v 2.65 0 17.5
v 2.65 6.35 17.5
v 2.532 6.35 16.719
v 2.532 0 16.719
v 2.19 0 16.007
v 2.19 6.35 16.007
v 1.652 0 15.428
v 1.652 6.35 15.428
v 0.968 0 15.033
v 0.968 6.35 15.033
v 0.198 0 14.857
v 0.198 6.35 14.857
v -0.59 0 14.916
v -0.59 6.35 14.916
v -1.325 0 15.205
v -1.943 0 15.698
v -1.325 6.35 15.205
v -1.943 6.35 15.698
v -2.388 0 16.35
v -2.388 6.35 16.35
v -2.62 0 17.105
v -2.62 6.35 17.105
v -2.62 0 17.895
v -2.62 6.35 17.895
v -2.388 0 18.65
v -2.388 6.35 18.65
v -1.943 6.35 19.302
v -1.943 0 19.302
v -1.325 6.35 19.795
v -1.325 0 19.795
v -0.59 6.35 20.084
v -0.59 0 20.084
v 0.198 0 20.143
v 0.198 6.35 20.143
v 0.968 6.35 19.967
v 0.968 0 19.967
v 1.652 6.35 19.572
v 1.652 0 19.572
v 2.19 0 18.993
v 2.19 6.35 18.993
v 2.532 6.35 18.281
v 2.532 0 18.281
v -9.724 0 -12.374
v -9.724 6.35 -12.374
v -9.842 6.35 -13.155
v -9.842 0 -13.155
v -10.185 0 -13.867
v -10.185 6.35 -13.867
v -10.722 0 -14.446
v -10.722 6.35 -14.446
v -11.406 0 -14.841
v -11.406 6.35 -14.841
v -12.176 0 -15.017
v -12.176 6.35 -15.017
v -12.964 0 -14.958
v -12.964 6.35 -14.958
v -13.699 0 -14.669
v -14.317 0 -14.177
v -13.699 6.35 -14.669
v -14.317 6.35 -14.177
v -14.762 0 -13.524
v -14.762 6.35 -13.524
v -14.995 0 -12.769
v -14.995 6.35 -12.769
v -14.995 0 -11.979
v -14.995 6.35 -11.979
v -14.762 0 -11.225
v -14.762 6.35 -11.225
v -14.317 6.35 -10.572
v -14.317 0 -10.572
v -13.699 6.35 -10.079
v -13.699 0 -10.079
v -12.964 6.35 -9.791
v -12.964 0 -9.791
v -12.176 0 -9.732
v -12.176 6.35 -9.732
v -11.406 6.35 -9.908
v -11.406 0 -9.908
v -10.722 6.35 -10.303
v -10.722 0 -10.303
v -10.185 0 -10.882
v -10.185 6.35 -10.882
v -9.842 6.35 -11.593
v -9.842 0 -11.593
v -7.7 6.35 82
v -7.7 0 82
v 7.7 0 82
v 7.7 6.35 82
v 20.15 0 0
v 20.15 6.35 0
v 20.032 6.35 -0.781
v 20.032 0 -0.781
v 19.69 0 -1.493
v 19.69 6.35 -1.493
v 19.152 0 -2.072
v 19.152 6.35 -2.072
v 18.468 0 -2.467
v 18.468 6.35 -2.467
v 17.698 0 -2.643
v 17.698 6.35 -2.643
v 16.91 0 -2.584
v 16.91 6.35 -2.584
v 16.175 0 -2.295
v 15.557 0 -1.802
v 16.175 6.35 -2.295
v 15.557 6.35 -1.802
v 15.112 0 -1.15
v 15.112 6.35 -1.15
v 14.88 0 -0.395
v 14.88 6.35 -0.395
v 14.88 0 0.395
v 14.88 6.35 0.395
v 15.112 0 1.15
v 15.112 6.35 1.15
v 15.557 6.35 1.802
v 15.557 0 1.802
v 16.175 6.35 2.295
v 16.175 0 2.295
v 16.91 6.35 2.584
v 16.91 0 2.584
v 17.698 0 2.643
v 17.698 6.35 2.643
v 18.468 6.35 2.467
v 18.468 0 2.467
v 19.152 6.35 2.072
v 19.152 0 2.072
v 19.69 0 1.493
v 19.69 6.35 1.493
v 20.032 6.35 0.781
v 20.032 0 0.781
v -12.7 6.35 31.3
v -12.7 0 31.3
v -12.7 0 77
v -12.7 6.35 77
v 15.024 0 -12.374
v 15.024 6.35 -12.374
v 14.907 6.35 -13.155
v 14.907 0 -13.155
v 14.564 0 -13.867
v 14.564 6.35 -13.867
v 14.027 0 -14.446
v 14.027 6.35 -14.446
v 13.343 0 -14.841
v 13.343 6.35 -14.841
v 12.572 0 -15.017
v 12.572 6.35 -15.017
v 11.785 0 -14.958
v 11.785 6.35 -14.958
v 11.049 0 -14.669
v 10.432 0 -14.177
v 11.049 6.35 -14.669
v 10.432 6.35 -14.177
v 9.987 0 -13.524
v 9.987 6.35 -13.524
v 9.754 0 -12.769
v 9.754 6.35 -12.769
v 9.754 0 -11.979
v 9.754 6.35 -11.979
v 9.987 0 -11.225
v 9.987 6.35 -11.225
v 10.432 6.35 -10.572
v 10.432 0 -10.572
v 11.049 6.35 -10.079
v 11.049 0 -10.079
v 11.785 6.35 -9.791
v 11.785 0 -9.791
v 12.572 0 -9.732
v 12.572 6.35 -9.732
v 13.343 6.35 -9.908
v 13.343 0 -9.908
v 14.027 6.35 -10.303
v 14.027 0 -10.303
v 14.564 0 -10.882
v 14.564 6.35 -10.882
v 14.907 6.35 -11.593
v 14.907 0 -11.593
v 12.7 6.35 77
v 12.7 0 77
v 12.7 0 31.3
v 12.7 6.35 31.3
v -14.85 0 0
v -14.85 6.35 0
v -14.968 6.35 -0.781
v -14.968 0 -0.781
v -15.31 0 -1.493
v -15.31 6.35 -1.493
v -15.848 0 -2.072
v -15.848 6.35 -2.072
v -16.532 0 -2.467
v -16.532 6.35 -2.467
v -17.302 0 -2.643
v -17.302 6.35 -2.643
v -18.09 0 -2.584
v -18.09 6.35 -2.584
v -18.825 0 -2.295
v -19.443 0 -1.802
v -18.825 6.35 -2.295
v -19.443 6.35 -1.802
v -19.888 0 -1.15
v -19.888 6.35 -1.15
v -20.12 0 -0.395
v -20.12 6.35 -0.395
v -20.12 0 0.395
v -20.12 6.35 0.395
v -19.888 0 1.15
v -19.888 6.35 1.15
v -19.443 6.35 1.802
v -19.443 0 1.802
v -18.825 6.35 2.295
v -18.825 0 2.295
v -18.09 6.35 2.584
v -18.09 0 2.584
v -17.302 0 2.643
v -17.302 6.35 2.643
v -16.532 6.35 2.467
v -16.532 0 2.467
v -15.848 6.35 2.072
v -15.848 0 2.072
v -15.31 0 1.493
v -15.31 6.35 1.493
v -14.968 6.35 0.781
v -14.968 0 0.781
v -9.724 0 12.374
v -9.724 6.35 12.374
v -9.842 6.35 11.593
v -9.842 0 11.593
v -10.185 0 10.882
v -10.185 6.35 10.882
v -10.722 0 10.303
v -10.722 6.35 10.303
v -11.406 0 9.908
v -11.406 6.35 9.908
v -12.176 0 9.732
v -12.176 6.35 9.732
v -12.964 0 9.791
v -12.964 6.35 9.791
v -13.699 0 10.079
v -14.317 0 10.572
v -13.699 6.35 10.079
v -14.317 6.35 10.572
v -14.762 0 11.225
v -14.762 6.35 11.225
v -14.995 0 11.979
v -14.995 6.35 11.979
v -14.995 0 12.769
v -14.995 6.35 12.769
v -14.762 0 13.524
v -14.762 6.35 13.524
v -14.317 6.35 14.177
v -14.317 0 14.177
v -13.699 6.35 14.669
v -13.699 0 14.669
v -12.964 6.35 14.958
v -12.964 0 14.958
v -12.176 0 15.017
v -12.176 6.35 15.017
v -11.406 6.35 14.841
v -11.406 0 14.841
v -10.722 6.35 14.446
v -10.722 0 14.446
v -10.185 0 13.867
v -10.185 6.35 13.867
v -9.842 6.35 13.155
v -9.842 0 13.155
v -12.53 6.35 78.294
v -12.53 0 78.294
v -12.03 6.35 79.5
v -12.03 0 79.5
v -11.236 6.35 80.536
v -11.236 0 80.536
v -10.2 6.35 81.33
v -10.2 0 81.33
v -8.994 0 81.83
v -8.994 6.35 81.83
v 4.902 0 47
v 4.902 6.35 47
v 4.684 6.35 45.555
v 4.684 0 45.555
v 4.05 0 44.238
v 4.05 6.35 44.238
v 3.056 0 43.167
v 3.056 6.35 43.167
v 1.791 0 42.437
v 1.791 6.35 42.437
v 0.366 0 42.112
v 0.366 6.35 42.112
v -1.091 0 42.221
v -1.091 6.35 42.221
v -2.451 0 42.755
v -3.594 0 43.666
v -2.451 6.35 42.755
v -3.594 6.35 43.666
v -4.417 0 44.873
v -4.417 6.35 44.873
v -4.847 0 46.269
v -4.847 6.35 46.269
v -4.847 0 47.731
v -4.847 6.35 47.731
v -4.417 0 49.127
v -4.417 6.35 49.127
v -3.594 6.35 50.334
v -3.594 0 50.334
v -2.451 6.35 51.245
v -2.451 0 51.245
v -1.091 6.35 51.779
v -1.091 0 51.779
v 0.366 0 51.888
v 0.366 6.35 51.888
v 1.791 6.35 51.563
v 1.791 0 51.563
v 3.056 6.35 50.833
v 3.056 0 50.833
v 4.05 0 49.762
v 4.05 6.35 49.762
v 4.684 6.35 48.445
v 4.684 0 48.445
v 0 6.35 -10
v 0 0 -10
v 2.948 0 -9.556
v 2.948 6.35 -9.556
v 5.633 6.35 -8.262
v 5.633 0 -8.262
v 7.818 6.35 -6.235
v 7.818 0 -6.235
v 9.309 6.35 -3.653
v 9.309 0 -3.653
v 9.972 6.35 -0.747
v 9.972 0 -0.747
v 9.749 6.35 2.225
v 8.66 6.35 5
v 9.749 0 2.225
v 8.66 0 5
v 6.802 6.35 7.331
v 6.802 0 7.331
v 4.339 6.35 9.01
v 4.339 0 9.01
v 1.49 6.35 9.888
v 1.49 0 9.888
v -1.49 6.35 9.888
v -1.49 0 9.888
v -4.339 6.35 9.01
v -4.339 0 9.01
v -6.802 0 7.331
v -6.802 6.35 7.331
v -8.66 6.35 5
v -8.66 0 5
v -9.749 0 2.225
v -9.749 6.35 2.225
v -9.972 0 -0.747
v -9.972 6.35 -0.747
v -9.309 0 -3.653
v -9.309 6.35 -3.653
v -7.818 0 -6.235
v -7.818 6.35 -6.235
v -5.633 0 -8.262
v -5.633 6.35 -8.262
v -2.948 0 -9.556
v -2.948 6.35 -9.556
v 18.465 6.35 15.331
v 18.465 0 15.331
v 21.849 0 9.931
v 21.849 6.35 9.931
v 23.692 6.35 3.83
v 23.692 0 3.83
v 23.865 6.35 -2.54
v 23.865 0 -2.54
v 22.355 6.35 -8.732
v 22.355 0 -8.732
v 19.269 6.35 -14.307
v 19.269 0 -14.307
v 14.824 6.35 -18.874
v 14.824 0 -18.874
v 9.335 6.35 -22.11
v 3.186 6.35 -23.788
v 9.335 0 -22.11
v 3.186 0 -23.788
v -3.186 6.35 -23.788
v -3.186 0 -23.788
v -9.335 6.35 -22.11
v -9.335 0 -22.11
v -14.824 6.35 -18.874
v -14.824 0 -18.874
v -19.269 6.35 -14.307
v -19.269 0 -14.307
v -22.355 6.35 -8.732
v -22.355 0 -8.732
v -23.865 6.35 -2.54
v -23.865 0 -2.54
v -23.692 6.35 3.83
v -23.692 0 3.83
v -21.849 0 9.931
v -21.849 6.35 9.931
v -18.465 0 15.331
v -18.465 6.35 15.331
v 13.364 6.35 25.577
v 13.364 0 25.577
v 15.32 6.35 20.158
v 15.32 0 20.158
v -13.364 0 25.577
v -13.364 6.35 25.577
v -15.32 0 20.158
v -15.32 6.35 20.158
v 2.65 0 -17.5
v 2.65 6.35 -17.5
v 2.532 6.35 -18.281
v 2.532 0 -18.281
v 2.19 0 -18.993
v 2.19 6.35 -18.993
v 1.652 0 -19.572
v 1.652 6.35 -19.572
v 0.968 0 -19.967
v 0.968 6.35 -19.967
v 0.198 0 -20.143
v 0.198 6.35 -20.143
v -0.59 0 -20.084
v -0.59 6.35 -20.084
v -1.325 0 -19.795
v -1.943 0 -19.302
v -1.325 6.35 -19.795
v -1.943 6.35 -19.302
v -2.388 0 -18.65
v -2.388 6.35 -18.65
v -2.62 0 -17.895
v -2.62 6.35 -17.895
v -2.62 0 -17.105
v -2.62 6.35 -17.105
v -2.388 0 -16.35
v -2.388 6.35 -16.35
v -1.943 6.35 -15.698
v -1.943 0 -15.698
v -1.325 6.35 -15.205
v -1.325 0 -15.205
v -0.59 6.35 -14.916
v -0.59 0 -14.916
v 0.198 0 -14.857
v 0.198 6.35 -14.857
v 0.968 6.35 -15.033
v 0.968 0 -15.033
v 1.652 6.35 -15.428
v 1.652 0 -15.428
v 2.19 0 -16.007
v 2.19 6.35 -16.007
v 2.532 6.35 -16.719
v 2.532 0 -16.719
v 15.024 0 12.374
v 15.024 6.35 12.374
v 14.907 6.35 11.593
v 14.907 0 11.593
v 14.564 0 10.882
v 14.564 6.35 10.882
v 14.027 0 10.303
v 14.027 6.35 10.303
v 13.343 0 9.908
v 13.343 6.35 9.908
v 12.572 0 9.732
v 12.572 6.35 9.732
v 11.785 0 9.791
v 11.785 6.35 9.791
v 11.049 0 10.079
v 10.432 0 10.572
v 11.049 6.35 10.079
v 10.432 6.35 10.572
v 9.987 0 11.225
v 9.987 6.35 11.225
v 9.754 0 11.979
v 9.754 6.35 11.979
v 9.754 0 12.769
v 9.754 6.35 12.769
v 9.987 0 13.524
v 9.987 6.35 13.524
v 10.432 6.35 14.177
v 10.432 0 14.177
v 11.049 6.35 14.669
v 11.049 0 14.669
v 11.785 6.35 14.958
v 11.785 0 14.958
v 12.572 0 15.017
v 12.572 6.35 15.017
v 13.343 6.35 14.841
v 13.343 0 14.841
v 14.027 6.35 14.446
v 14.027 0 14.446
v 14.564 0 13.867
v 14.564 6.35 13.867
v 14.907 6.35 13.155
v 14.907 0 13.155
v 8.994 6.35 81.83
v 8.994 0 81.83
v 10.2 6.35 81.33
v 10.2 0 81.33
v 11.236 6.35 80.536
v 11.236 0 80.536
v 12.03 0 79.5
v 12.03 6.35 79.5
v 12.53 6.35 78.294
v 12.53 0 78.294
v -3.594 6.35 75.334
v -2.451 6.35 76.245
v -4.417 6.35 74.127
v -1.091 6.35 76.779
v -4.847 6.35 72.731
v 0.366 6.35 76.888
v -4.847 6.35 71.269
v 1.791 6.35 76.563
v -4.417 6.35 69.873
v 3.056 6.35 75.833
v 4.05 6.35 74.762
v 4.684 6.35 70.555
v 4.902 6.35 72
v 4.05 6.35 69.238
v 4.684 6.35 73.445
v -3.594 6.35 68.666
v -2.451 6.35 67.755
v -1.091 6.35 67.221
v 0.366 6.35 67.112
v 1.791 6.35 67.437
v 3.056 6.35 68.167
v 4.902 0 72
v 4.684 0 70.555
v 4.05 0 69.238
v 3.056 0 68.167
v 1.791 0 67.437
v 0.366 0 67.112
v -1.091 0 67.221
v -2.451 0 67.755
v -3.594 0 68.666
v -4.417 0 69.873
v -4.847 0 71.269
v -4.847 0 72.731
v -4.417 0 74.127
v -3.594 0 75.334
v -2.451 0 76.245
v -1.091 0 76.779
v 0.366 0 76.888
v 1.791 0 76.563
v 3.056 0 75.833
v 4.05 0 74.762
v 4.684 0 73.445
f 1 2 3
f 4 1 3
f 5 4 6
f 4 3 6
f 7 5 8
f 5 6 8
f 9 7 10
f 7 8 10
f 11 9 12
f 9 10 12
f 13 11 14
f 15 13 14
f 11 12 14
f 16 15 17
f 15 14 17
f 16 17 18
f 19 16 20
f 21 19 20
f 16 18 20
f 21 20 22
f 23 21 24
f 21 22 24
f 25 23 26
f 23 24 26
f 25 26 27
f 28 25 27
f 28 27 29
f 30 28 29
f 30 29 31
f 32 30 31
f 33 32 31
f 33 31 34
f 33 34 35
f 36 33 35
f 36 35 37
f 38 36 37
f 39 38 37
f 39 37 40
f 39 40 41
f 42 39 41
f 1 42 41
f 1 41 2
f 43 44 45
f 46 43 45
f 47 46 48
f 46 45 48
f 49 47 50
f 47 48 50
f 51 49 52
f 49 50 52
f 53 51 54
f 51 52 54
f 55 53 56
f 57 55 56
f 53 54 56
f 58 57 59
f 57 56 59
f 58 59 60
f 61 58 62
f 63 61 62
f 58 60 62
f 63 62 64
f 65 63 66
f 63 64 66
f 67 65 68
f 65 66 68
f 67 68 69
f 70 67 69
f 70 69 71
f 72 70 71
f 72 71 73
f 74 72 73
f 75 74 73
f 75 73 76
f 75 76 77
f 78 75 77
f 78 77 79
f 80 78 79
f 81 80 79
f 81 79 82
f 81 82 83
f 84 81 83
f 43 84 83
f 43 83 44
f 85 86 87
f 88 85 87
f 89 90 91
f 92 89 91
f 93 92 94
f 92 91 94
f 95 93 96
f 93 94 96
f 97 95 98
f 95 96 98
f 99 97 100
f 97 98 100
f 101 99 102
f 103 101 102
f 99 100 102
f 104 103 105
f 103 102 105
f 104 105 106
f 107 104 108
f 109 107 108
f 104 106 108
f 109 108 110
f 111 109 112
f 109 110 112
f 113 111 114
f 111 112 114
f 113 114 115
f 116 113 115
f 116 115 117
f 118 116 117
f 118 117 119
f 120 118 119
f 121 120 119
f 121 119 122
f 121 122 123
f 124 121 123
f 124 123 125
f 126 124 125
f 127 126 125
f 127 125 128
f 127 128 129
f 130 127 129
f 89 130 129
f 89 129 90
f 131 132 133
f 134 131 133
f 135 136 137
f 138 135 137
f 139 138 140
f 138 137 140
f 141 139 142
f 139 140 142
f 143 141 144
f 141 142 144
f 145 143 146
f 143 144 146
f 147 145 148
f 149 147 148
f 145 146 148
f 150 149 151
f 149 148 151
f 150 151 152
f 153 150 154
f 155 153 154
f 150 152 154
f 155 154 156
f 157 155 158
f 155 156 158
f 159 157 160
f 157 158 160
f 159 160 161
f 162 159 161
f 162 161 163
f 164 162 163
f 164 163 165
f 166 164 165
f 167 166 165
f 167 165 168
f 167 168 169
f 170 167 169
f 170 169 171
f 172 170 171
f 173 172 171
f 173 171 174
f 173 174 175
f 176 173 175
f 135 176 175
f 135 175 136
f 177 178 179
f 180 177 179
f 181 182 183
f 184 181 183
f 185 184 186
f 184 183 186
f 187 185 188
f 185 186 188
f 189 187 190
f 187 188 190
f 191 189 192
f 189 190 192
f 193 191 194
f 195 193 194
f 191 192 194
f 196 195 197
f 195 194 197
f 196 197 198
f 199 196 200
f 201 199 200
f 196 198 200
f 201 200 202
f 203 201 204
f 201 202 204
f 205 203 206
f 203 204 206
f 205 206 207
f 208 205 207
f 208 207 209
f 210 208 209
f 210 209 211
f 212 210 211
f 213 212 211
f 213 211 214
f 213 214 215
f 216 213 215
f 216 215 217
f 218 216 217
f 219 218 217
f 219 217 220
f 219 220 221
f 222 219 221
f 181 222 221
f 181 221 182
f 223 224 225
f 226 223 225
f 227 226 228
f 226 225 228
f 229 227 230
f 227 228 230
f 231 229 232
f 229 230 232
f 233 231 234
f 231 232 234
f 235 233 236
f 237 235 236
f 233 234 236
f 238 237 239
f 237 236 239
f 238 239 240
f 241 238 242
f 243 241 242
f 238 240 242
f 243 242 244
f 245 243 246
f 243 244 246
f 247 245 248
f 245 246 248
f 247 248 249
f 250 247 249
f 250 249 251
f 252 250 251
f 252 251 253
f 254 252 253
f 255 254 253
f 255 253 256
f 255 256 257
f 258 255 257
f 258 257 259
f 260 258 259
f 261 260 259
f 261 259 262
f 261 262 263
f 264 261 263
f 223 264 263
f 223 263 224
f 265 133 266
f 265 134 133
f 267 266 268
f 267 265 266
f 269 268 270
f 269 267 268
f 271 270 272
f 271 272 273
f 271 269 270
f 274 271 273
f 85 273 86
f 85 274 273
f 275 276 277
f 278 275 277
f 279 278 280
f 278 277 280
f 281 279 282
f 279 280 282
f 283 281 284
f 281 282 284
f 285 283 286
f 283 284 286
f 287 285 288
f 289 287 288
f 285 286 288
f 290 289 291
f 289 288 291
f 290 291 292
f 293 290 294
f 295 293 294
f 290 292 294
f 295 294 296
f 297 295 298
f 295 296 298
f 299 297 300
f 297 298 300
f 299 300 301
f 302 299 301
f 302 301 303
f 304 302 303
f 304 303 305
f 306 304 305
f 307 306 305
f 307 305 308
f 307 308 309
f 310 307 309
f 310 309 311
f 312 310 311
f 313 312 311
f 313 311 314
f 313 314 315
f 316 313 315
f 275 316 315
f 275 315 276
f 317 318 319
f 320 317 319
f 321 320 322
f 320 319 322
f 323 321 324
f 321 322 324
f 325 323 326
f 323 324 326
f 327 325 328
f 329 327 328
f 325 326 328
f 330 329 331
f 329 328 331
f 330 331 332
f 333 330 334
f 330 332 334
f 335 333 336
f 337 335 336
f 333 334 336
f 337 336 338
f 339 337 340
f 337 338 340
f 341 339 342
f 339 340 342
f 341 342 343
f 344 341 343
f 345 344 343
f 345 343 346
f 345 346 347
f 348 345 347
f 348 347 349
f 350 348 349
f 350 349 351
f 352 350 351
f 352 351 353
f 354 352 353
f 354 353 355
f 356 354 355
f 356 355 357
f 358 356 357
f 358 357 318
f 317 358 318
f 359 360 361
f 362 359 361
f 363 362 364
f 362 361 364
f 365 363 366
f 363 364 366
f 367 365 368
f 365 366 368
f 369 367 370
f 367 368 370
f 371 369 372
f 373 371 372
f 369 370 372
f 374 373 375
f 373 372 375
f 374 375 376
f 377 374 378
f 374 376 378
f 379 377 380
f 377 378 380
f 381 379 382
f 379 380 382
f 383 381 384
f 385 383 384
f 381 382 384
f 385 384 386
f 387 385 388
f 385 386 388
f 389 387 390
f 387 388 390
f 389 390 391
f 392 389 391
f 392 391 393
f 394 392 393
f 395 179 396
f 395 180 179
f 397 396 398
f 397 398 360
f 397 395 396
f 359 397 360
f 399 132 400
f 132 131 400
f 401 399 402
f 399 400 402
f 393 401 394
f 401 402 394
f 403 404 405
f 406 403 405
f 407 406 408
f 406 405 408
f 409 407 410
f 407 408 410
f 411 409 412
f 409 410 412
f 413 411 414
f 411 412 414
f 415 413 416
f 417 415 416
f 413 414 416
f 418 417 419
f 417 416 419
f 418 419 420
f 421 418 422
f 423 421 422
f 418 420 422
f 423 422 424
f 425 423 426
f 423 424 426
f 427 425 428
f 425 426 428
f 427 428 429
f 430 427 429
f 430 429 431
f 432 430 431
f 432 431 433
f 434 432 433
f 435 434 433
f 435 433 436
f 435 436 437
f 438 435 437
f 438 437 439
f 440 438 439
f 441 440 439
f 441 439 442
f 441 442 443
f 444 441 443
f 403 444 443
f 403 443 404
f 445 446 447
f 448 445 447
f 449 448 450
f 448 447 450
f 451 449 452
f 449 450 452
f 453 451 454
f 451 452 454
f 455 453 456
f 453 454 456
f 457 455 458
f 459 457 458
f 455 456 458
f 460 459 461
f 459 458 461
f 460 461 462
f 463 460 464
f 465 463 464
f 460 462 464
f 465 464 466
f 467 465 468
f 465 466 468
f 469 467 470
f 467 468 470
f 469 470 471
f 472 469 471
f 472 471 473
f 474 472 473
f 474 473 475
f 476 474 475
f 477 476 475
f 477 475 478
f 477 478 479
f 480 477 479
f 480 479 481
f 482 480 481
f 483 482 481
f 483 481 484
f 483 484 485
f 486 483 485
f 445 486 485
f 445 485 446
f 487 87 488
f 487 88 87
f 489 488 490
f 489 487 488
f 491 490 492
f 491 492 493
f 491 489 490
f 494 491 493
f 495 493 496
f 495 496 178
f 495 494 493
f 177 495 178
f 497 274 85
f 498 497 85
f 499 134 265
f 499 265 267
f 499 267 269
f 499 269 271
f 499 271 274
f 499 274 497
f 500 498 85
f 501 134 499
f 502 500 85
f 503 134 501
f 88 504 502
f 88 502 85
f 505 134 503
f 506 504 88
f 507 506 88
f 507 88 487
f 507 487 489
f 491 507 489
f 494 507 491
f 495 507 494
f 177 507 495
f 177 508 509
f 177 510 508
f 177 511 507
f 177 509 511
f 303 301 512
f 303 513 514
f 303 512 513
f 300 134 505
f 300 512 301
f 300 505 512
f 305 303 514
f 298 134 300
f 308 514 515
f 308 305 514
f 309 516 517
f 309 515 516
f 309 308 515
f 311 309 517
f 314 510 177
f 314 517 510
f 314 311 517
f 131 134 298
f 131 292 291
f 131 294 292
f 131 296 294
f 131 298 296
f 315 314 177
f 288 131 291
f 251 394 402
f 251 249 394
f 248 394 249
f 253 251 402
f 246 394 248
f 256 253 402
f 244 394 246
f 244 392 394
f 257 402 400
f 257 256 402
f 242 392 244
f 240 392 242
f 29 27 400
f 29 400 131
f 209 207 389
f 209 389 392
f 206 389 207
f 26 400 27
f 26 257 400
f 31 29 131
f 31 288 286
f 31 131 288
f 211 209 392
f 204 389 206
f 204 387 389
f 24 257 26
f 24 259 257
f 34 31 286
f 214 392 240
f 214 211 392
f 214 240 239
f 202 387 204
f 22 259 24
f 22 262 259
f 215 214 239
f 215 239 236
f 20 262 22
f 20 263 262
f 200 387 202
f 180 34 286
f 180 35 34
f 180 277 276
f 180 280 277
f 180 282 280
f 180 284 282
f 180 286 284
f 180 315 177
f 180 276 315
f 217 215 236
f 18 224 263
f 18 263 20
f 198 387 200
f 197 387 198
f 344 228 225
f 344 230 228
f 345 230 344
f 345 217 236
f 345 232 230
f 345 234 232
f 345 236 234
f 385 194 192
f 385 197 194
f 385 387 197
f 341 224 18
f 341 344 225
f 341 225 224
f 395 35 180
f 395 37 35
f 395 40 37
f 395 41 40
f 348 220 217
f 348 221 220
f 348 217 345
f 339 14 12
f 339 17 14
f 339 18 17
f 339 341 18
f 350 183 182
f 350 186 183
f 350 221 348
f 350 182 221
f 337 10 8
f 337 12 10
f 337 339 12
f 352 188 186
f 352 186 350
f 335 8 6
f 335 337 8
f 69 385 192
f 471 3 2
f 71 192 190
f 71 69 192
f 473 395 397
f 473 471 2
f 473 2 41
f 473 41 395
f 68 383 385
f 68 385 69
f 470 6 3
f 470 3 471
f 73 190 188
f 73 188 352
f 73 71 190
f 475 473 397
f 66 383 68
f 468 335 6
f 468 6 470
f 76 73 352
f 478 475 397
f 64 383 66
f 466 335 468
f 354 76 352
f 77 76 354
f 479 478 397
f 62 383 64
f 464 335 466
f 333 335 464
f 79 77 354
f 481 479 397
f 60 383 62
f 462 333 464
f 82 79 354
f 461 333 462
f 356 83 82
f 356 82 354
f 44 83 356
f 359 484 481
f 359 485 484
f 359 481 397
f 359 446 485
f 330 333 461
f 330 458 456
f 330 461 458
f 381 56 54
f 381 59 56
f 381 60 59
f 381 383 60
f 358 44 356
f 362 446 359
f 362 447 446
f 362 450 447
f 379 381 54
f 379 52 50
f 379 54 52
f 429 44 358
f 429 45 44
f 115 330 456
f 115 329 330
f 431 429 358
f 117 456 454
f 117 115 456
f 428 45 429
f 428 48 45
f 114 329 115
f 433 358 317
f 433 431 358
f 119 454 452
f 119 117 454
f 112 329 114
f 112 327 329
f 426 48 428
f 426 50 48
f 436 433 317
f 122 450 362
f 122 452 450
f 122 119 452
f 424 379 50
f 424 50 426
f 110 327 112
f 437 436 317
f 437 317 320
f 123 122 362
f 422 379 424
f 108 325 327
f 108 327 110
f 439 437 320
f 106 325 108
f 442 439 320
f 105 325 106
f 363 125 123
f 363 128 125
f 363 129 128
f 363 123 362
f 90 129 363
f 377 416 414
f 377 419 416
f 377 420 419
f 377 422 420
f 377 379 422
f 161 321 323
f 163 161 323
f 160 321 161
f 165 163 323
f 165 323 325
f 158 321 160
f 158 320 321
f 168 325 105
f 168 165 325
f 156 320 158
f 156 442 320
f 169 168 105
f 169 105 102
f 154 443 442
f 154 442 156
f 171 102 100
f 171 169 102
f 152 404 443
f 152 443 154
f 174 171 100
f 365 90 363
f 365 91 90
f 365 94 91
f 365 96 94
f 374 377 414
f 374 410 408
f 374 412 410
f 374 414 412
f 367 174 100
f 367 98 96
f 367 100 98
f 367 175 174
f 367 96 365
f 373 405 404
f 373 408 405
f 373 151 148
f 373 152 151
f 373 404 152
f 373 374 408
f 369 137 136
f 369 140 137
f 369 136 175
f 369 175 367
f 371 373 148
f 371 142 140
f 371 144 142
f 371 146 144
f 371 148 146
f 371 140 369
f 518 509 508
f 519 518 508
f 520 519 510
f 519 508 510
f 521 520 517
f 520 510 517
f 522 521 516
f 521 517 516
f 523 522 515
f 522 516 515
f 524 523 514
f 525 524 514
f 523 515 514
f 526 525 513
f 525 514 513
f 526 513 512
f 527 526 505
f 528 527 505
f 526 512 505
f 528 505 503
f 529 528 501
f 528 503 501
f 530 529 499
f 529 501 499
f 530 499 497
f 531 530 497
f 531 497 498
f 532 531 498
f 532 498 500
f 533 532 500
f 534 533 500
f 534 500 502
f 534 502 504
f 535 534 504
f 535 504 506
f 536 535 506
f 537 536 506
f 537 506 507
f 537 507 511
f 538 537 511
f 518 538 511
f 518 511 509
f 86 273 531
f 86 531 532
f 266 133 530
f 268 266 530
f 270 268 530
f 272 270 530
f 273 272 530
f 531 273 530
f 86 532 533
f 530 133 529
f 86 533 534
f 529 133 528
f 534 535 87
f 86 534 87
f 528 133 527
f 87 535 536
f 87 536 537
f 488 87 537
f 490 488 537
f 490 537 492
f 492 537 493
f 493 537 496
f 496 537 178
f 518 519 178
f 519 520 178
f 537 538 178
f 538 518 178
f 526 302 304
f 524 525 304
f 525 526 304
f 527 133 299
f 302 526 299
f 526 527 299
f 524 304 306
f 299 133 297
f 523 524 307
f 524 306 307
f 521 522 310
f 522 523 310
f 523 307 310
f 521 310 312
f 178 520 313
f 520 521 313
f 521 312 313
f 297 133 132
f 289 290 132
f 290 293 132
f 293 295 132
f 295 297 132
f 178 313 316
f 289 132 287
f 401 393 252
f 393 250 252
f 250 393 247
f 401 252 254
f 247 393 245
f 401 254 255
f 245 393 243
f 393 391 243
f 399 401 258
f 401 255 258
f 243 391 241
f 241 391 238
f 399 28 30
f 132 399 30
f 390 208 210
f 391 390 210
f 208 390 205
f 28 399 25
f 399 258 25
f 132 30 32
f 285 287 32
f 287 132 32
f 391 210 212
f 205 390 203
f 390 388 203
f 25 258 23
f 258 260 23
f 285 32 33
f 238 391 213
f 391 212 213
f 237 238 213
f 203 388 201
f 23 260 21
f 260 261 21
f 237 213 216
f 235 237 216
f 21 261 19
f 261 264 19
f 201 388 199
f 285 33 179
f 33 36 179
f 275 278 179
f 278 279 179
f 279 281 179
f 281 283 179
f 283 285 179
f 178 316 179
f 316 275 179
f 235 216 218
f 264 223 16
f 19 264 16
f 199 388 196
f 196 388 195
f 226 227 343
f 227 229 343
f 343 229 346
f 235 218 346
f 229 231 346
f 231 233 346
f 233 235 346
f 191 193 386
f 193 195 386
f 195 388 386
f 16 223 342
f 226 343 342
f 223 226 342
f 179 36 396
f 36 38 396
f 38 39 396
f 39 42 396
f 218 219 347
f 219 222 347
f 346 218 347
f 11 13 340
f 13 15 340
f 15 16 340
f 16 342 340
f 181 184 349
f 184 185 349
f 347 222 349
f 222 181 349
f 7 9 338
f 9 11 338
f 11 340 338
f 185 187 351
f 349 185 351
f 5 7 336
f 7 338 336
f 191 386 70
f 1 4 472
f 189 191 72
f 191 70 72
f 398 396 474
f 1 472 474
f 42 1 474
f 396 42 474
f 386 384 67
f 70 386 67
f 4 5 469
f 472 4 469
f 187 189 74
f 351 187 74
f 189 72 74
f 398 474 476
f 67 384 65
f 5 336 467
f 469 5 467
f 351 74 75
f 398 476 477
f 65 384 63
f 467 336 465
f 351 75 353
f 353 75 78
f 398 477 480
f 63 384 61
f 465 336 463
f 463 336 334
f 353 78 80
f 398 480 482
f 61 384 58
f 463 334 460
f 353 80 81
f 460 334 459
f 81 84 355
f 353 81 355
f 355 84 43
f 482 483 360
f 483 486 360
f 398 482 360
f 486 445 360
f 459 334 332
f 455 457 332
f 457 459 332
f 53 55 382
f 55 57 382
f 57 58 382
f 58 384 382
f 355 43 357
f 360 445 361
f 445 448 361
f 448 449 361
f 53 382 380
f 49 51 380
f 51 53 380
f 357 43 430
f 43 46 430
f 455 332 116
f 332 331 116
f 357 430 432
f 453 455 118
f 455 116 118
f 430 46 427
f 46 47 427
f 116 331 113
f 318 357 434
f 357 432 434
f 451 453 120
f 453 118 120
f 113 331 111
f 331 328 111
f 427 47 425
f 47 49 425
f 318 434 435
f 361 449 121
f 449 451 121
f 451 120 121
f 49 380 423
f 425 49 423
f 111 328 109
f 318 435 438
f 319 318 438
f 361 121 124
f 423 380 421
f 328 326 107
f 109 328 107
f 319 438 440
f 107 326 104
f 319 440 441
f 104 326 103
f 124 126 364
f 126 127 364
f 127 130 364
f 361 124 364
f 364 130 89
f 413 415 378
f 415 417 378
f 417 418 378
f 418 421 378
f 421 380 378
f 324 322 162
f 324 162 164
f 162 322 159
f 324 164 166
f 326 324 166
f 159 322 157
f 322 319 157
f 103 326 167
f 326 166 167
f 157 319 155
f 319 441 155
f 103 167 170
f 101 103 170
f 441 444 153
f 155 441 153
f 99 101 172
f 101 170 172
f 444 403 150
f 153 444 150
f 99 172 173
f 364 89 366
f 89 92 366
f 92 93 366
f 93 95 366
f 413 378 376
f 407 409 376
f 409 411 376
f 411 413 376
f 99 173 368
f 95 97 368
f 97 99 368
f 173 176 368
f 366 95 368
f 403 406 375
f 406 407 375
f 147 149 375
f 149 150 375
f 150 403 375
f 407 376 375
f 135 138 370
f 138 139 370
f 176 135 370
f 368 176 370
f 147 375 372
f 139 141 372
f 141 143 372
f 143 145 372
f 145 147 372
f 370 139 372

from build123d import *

# Parameters (mm, degrees)
BOSS_EXTRUDE1_DEPTH     = 6.35
M5_CLEARANCE_HOLE1_D    = 5.3
SKETCH5_R               = 10
CUT_EXTRUDE1_DEPTH      = 86.675682081
FILLET1_R               = 25
FILLET2_R               = 5
F_3_8_CLEARANCE_HOLE1_D = 9.8044


with BuildPart() as part:
    # Sketch1 → Boss-Extrude1 (new body)
    with BuildSketch(Plane(origin=(0, 0, 0), x_dir=(1, 0, 0), z_dir=(0, 1, 0))):
        with BuildLine():
            Line((-12.7, -82), (12.7, -82))
            Line((12.7, -82), (12.7, -20.364429774))
            ThreePointArc((12.7, -20.364429774), (0, 24), (-12.7, -20.364429774))
            Line((-12.7, -20.364429774), (-12.7, -82))
        make_face()
    extrude(amount=BOSS_EXTRUDE1_DEPTH)

    # M5 Clearance Hole1 (through all)
    with Locations(Plane(origin=(0, 0, 0), x_dir=(-1, 0, 0), z_dir=(0, -1, 0))):
        with Locations((0, 17.5), (12.374368671, 12.374368671), (17.5, 0), (12.374368671, -12.374368671), (0, -17.5), (-12.374368671, -12.374368671), (-17.5, 0), (-12.374368671, 12.374368671)):
            Hole(M5_CLEARANCE_HOLE1_D / 2)

    # Sketch5 → Cut-Extrude1 (cut, through all)
    with BuildSketch(Plane.XZ):
        Circle(SKETCH5_R)
    extrude(amount=-CUT_EXTRUDE1_DEPTH, mode=Mode.SUBTRACT)

    # Fillet1
    fillet1_edges = [part.edges().sort_by_distance(p)[0] for p in [
        (-12.7, 3.175, 20.364429774),
        (12.7, 3.175, 20.364429774),
    ]]
    fillet(fillet1_edges, radius=FILLET1_R)

    # Fillet2
    fillet2_edges = [part.edges().sort_by_distance(p)[0] for p in [
        (12.7, 3.175, 82),
        (-12.7, 3.175, 82),
    ]]
    fillet(fillet2_edges, radius=FILLET2_R)

    # 3/8 Clearance Hole1 (through all)
    with Locations(Plane(origin=(0, 0, 0), x_dir=(-1, 0, 0), z_dir=(0, -1, 0))):
        with Locations((0, -47), (0, -72)):
            Hole(F_3_8_CLEARANCE_HOLE1_D / 2)


solid = part.part
